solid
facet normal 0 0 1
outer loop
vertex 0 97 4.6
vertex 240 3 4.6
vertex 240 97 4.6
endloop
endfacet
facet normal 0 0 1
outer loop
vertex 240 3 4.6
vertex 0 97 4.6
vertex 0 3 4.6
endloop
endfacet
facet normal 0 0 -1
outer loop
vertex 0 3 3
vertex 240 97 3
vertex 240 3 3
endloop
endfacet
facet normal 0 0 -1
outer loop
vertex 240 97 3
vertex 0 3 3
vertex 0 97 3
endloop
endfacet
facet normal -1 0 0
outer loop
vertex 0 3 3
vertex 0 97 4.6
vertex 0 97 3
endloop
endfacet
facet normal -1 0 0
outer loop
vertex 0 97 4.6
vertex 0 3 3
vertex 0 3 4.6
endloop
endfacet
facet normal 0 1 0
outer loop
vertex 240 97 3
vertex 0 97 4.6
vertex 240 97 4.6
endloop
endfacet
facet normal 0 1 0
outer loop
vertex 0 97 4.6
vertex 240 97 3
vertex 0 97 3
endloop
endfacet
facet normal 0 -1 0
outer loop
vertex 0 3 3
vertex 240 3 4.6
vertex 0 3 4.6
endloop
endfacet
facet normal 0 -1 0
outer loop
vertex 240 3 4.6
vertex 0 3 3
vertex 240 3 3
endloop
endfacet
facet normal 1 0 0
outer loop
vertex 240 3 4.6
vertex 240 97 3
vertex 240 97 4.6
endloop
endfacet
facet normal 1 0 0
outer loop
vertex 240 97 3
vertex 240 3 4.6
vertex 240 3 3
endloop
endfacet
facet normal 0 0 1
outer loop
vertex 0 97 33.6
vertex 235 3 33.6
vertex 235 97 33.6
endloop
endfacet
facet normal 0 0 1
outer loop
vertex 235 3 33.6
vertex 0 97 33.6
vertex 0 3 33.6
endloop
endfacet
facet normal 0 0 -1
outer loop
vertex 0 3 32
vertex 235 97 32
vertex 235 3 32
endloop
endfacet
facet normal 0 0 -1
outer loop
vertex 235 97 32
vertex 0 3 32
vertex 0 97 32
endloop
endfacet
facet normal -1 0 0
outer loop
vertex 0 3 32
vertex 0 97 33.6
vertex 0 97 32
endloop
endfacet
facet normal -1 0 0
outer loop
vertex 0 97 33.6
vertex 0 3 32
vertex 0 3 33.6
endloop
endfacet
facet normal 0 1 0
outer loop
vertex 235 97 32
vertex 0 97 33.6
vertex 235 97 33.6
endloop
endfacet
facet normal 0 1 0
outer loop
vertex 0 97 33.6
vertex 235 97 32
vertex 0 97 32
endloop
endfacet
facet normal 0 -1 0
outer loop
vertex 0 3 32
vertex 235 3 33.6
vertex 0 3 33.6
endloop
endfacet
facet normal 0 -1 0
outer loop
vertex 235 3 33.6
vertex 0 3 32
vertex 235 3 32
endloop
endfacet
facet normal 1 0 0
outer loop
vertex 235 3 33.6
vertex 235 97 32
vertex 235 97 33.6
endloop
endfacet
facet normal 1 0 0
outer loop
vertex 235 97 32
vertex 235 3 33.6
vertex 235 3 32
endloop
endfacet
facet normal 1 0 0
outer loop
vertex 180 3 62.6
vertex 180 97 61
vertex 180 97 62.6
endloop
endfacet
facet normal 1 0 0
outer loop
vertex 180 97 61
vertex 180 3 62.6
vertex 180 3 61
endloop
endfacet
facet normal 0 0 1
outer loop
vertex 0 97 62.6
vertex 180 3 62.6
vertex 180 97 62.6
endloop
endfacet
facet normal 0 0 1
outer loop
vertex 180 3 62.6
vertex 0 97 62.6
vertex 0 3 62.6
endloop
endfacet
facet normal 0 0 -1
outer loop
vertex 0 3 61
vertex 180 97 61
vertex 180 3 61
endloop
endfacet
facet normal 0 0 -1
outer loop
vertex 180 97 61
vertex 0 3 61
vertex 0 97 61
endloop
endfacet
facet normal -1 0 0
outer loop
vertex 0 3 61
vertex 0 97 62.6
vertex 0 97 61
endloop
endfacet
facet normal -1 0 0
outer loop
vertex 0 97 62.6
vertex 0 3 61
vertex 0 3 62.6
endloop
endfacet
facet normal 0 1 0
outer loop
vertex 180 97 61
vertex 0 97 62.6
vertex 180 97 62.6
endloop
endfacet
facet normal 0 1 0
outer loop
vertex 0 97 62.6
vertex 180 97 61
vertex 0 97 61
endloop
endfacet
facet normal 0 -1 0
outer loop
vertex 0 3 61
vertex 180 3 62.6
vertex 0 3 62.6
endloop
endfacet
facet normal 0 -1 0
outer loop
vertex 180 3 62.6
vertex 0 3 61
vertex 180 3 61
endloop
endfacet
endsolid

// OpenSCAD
// PlataVM PACKAGING-P1 placeholder model
// Version: V1.9
// Purpose: board-envelope and height-budget review only
// No final components, connectors, mounting holes or production geometry.

$fn = 64;

assembly_x = 250;
assembly_y = 100;
assembly_z = 80;
board_t = 1.6;

z_l0 = 3;
z_l1 = 32;
z_l2 = 61;

h_l0 = 23;
h_l1 = 23;
h_l2 = 16;

module board_block(x, y, z, sx, sy, h, name="") {
    translate([x, y, z]) {
        cube([sx, sy, board_t]);
        translate([0, 0, board_t])
            %cube([sx, sy, h]);
    }
}

module assembly_envelope() {
    %cube([assembly_x, assembly_y, assembly_z]);
}

module mounting_axis(x, y) {
    translate([x, y, 0])
        %cylinder(h=assembly_z, d=10);
}

assembly_envelope();

// L0: PCB-A + PCB-C = 240 mm
board_block(0, 3, z_l0, 110, 94, h_l0, "PCB-A");
board_block(110, 3, z_l0, 130, 94, h_l0, "PCB-C");

// L1: PCB-D + PCB-E = 235 mm
board_block(0, 3, z_l1, 125, 94, h_l1, "PCB-D");
board_block(125, 3, z_l1, 110, 94, h_l1, "PCB-E");

// L2: PCB-B = 180 mm
board_block(0, 3, z_l2, 180, 94, h_l2, "PCB-B");

// Generic mounting/tool-access axes. Coordinates are preliminary only.
mounting_axis(7.5, 10.5);
mounting_axis(7.5, 89.5);
mounting_axis(102.5, 10.5);
mounting_axis(102.5, 89.5);
mounting_axis(117.5, 10.5);
mounting_axis(117.5, 89.5);
mounting_axis(232.5, 10.5);
mounting_axis(232.5, 89.5);

// Reference planes for level separation.
translate([0, 0, z_l0 + board_t + h_l0])
    %cube([assembly_x, assembly_y, 0.2]);
translate([0, 0, z_l1 + board_t + h_l1])
    %cube([assembly_x, assembly_y, 0.2]);
translate([0, 0, z_l2 + board_t + h_l2])
    %cube([assembly_x, assembly_y, 0.2]);
